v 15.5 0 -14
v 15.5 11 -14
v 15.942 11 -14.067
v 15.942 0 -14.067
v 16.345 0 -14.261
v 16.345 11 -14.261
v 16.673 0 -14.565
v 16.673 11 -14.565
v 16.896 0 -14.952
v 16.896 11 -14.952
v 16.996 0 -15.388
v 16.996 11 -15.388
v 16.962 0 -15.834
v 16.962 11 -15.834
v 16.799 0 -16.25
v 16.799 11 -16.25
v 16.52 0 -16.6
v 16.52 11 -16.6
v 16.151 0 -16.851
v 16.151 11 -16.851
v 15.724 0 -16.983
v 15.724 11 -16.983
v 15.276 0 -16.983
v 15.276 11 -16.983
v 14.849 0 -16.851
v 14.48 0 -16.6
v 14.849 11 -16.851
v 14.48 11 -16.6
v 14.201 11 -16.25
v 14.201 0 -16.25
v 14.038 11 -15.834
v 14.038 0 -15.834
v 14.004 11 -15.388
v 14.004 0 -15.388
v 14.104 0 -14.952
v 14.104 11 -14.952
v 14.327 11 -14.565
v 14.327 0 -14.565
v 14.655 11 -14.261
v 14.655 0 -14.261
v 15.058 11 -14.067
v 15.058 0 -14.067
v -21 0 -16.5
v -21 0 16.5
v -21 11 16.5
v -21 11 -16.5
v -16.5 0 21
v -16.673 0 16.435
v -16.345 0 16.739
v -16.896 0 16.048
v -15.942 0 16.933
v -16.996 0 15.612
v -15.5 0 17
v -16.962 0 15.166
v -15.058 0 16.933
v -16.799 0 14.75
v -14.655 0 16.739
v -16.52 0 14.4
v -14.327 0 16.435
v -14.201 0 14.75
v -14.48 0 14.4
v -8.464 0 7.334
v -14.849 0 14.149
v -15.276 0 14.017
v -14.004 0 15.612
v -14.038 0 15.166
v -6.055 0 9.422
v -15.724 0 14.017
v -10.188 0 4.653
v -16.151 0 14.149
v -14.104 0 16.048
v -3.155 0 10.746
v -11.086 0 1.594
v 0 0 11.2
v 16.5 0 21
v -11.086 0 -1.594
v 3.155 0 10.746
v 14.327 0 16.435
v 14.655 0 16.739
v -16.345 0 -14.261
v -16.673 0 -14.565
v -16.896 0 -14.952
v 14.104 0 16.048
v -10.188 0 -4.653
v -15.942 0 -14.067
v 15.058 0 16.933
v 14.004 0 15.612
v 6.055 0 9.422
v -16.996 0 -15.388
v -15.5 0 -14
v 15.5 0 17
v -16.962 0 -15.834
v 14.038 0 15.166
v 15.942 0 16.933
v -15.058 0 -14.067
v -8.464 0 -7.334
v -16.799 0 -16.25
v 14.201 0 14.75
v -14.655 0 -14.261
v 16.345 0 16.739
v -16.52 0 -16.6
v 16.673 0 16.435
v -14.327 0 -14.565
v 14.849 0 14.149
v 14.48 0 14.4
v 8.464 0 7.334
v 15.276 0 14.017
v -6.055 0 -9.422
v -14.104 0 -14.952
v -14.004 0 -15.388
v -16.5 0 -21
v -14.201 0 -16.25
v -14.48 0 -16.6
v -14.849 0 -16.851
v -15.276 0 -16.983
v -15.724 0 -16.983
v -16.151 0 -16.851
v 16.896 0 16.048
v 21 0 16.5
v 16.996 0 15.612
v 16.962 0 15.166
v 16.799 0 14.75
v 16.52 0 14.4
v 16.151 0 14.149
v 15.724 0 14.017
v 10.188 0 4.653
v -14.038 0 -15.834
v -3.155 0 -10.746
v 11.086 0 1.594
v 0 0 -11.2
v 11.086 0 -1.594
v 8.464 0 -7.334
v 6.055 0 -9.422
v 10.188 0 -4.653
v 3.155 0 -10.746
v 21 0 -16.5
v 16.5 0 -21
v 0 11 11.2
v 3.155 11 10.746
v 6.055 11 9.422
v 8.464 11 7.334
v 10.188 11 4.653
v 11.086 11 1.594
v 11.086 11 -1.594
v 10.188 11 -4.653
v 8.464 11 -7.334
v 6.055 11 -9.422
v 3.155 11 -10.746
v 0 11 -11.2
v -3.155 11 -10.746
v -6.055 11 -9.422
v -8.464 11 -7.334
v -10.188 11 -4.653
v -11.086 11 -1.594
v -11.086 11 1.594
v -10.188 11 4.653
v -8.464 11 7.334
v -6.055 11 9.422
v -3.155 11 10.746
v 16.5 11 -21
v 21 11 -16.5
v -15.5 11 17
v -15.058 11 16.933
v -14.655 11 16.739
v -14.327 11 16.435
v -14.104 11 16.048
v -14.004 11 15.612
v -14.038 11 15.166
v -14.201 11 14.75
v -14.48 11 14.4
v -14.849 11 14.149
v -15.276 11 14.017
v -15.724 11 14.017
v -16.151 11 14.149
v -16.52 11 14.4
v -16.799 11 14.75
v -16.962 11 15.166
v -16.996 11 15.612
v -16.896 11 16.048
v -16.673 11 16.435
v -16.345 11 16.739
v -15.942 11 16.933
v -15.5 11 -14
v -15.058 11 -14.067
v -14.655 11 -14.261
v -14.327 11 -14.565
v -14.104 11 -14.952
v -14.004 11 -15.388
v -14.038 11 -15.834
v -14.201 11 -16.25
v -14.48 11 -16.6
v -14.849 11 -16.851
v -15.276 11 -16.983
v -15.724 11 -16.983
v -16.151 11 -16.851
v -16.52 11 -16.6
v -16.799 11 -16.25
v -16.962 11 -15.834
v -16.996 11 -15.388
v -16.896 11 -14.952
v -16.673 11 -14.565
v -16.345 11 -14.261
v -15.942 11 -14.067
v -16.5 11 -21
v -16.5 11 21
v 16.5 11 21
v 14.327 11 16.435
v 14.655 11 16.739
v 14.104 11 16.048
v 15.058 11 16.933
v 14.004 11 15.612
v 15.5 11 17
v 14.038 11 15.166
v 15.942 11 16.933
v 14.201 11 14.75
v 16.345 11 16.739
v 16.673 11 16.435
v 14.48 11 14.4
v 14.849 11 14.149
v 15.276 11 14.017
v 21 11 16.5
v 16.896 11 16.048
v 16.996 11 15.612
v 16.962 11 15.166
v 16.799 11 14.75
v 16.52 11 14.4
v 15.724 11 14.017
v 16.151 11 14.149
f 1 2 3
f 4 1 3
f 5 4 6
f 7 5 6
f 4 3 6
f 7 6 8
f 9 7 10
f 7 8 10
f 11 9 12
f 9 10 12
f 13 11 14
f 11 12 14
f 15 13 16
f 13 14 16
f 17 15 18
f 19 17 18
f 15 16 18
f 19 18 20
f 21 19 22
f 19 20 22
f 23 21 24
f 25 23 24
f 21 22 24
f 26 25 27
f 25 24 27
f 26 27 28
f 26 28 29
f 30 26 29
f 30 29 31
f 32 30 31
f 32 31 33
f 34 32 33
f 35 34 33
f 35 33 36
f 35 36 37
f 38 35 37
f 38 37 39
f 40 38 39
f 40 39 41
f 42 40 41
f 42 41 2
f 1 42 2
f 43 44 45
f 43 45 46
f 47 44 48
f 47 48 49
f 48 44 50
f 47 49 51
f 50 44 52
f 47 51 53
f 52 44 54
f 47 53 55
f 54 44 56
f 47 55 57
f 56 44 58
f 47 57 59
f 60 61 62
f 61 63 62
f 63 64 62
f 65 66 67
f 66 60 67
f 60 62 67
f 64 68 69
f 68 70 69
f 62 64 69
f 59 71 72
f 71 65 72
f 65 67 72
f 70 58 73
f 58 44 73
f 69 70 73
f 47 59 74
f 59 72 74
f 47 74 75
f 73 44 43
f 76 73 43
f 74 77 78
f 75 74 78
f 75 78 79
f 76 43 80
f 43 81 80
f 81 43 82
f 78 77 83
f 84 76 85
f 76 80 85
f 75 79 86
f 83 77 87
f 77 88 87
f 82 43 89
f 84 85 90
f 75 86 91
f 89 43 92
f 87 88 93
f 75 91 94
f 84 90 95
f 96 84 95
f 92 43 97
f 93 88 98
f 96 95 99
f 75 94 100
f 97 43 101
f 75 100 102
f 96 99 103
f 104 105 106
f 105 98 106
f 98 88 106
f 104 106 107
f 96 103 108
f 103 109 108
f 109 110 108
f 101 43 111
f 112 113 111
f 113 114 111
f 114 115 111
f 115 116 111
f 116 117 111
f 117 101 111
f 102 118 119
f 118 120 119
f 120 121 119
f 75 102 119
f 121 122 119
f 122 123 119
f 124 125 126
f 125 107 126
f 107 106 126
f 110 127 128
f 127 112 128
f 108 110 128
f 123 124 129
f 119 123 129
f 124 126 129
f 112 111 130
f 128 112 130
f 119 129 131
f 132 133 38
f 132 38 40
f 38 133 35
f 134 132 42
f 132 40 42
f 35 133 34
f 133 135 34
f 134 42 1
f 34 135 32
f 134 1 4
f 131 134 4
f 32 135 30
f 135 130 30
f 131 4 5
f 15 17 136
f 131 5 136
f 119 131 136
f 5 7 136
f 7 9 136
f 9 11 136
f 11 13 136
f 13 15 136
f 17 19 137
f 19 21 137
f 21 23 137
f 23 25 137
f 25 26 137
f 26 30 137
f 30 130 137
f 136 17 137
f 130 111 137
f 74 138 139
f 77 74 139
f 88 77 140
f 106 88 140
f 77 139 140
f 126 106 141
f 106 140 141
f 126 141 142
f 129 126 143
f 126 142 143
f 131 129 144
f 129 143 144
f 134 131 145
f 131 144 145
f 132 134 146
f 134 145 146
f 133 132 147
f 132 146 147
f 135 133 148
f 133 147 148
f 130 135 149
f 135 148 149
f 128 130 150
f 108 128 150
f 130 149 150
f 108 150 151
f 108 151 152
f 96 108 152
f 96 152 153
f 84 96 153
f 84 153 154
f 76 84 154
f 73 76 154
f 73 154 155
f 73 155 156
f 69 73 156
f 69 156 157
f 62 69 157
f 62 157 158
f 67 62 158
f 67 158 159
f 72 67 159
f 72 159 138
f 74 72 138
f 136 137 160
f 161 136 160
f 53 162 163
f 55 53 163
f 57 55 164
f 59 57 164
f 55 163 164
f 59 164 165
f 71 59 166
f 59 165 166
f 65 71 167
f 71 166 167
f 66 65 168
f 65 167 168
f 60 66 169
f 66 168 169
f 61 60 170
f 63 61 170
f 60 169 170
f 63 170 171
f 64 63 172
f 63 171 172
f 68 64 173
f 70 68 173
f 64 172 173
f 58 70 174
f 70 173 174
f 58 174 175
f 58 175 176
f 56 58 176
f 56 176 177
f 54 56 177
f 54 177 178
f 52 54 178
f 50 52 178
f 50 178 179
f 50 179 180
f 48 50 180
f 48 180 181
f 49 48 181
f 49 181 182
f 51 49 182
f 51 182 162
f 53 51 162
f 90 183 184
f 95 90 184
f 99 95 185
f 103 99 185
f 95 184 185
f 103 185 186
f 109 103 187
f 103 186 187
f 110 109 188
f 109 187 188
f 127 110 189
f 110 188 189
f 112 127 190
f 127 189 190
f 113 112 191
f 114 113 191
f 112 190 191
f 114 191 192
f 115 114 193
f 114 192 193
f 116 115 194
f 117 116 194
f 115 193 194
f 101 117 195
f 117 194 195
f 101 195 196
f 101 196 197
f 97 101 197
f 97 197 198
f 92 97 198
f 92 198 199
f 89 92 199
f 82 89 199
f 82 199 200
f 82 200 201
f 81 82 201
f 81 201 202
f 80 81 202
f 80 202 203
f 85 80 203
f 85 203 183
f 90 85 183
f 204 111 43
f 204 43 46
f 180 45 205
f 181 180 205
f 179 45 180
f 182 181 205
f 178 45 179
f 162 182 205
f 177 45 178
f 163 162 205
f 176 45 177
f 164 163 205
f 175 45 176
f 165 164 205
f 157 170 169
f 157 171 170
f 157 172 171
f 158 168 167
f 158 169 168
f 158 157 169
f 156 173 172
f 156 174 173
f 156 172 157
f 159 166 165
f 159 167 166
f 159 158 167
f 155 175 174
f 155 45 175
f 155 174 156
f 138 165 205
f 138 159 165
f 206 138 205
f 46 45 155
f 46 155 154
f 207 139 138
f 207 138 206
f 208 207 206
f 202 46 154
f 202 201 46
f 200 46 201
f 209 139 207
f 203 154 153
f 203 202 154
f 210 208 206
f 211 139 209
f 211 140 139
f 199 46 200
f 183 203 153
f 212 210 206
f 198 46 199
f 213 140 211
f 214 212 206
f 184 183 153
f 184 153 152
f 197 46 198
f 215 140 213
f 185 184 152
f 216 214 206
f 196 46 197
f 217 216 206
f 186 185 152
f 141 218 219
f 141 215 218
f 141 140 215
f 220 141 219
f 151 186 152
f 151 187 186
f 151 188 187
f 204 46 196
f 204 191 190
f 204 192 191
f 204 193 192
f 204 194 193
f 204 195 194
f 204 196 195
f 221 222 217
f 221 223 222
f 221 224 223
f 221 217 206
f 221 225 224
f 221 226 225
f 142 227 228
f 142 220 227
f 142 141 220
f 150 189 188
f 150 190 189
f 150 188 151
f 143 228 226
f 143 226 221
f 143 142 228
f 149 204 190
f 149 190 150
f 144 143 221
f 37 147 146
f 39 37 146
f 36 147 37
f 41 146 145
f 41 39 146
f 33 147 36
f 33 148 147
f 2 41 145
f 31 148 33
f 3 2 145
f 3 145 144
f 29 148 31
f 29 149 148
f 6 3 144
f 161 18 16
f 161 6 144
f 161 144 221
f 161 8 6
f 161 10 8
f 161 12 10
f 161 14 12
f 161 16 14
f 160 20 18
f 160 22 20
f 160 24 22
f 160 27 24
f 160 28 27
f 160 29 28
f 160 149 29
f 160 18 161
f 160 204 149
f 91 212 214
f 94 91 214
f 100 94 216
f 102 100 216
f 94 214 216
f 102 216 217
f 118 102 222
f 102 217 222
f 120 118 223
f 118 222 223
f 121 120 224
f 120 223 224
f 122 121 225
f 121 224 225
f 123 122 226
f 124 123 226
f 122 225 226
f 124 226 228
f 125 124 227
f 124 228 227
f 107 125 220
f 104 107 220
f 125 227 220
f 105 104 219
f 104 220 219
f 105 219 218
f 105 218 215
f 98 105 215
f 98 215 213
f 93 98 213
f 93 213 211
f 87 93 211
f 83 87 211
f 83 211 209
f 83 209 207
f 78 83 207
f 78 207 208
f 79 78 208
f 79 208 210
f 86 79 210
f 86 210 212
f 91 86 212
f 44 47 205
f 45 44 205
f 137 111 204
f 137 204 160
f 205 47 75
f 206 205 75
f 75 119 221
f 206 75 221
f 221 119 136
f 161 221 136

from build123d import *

# Parameters (mm, degrees)
SKETCH1_W           = 42
SKETCH1_H           = 42
BOSS_EXTRUDE1_DEPTH = 11
CHAMFER1_SIZE       = 4.5
CUT_EXTRUDE1_REACH  = 33.67
SKETCH3_R           = 1.5
CUT_EXTRUDE2_REACH  = 33.67
SKETCH4_R           = 11.2


with BuildPart() as part:
    # Sketch1 → Boss-Extrude1 (new body)
    with BuildSketch(Plane(origin=(0, 0, 0), x_dir=(1, 0, 0), z_dir=(0, 1, 0))):
        Rectangle(SKETCH1_W, SKETCH1_H)
    extrude(amount=BOSS_EXTRUDE1_DEPTH)

    # Chamfer1
    chamfer1_edges = [part.edges().sort_by_distance(p)[0] for p in [
        (21, 5.5, 21),
        (-21, 5.5, 21),
        (-21, 5.5, -21),
        (21, 5.5, -21),
    ]]
    chamfer(chamfer1_edges, length=CHAMFER1_SIZE)

    # Sketch3 → Cut-Extrude1 (cut, up to next)
    with BuildSketch(Plane(origin=(0, 11, 0), x_dir=(1, 0, 0), z_dir=(0, 1, 0)), mode=Mode.PRIVATE) as cut_extrude1_sk1:
        with Locations(Location((-15.5, 15.5, 0), (0, 0, 270))):
            Circle(SKETCH3_R)
    cut_extrude1_tool1 = extrude(cut_extrude1_sk1.sketch, amount=-CUT_EXTRUDE1_REACH, mode=Mode.PRIVATE) & part.part
    # Sketch3 → Cut-Extrude1 (cut, up to next)
    with BuildSketch(Plane(origin=(0, 11, 0), x_dir=(1, 0, 0), z_dir=(0, 1, 0)), mode=Mode.PRIVATE) as cut_extrude1_sk2:
        with Locations(Location((15.5, 15.5, 0), (0, 0, 270))):
            Circle(SKETCH3_R)
    cut_extrude1_tool2 = extrude(cut_extrude1_sk2.sketch, amount=-CUT_EXTRUDE1_REACH, mode=Mode.PRIVATE) & part.part
    # Sketch3 → Cut-Extrude1 (cut, up to next)
    with BuildSketch(Plane(origin=(0, 11, 0), x_dir=(1, 0, 0), z_dir=(0, 1, 0)), mode=Mode.PRIVATE) as cut_extrude1_sk3:
        with Locations(Location((15.5, -15.5, 0), (0, 0, 270))):
            Circle(SKETCH3_R)
    cut_extrude1_tool3 = extrude(cut_extrude1_sk3.sketch, amount=-CUT_EXTRUDE1_REACH, mode=Mode.PRIVATE) & part.part
    # Sketch3 → Cut-Extrude1 (cut, up to next)
    with BuildSketch(Plane(origin=(0, 11, 0), x_dir=(1, 0, 0), z_dir=(0, 1, 0)), mode=Mode.PRIVATE) as cut_extrude1_sk4:
        with Locations(Location((-15.5, -15.5, 0), (0, 0, 270))):
            Circle(SKETCH3_R)
    cut_extrude1_tool4 = extrude(cut_extrude1_sk4.sketch, amount=-CUT_EXTRUDE1_REACH, mode=Mode.PRIVATE) & part.part
    add(cut_extrude1_tool1.solids().sort_by_distance((-15.5, 11, -15.5))[0], mode=Mode.SUBTRACT)
    add(cut_extrude1_tool2.solids().sort_by_distance((15.5, 11, -15.5))[0], mode=Mode.SUBTRACT)
    add(cut_extrude1_tool3.solids().sort_by_distance((15.5, 11, 15.5))[0], mode=Mode.SUBTRACT)
    add(cut_extrude1_tool4.solids().sort_by_distance((-15.5, 11, 15.5))[0], mode=Mode.SUBTRACT)

    # Sketch4 → Cut-Extrude2 (cut, up to next)
    with BuildSketch(Plane(origin=(0, 11, 0), x_dir=(1, 0, 0), z_dir=(0, 1, 0)), mode=Mode.PRIVATE) as cut_extrude2_sk1:
        with Locations(Location((0, 0, 0), (0, 0, 270))):
            Circle(SKETCH4_R)
    cut_extrude2_tool1 = extrude(cut_extrude2_sk1.sketch, amount=-CUT_EXTRUDE2_REACH, mode=Mode.PRIVATE) & part.part
    add(cut_extrude2_tool1.solids().sort_by_distance((0, 11, 0))[0], mode=Mode.SUBTRACT)


solid = part.part
